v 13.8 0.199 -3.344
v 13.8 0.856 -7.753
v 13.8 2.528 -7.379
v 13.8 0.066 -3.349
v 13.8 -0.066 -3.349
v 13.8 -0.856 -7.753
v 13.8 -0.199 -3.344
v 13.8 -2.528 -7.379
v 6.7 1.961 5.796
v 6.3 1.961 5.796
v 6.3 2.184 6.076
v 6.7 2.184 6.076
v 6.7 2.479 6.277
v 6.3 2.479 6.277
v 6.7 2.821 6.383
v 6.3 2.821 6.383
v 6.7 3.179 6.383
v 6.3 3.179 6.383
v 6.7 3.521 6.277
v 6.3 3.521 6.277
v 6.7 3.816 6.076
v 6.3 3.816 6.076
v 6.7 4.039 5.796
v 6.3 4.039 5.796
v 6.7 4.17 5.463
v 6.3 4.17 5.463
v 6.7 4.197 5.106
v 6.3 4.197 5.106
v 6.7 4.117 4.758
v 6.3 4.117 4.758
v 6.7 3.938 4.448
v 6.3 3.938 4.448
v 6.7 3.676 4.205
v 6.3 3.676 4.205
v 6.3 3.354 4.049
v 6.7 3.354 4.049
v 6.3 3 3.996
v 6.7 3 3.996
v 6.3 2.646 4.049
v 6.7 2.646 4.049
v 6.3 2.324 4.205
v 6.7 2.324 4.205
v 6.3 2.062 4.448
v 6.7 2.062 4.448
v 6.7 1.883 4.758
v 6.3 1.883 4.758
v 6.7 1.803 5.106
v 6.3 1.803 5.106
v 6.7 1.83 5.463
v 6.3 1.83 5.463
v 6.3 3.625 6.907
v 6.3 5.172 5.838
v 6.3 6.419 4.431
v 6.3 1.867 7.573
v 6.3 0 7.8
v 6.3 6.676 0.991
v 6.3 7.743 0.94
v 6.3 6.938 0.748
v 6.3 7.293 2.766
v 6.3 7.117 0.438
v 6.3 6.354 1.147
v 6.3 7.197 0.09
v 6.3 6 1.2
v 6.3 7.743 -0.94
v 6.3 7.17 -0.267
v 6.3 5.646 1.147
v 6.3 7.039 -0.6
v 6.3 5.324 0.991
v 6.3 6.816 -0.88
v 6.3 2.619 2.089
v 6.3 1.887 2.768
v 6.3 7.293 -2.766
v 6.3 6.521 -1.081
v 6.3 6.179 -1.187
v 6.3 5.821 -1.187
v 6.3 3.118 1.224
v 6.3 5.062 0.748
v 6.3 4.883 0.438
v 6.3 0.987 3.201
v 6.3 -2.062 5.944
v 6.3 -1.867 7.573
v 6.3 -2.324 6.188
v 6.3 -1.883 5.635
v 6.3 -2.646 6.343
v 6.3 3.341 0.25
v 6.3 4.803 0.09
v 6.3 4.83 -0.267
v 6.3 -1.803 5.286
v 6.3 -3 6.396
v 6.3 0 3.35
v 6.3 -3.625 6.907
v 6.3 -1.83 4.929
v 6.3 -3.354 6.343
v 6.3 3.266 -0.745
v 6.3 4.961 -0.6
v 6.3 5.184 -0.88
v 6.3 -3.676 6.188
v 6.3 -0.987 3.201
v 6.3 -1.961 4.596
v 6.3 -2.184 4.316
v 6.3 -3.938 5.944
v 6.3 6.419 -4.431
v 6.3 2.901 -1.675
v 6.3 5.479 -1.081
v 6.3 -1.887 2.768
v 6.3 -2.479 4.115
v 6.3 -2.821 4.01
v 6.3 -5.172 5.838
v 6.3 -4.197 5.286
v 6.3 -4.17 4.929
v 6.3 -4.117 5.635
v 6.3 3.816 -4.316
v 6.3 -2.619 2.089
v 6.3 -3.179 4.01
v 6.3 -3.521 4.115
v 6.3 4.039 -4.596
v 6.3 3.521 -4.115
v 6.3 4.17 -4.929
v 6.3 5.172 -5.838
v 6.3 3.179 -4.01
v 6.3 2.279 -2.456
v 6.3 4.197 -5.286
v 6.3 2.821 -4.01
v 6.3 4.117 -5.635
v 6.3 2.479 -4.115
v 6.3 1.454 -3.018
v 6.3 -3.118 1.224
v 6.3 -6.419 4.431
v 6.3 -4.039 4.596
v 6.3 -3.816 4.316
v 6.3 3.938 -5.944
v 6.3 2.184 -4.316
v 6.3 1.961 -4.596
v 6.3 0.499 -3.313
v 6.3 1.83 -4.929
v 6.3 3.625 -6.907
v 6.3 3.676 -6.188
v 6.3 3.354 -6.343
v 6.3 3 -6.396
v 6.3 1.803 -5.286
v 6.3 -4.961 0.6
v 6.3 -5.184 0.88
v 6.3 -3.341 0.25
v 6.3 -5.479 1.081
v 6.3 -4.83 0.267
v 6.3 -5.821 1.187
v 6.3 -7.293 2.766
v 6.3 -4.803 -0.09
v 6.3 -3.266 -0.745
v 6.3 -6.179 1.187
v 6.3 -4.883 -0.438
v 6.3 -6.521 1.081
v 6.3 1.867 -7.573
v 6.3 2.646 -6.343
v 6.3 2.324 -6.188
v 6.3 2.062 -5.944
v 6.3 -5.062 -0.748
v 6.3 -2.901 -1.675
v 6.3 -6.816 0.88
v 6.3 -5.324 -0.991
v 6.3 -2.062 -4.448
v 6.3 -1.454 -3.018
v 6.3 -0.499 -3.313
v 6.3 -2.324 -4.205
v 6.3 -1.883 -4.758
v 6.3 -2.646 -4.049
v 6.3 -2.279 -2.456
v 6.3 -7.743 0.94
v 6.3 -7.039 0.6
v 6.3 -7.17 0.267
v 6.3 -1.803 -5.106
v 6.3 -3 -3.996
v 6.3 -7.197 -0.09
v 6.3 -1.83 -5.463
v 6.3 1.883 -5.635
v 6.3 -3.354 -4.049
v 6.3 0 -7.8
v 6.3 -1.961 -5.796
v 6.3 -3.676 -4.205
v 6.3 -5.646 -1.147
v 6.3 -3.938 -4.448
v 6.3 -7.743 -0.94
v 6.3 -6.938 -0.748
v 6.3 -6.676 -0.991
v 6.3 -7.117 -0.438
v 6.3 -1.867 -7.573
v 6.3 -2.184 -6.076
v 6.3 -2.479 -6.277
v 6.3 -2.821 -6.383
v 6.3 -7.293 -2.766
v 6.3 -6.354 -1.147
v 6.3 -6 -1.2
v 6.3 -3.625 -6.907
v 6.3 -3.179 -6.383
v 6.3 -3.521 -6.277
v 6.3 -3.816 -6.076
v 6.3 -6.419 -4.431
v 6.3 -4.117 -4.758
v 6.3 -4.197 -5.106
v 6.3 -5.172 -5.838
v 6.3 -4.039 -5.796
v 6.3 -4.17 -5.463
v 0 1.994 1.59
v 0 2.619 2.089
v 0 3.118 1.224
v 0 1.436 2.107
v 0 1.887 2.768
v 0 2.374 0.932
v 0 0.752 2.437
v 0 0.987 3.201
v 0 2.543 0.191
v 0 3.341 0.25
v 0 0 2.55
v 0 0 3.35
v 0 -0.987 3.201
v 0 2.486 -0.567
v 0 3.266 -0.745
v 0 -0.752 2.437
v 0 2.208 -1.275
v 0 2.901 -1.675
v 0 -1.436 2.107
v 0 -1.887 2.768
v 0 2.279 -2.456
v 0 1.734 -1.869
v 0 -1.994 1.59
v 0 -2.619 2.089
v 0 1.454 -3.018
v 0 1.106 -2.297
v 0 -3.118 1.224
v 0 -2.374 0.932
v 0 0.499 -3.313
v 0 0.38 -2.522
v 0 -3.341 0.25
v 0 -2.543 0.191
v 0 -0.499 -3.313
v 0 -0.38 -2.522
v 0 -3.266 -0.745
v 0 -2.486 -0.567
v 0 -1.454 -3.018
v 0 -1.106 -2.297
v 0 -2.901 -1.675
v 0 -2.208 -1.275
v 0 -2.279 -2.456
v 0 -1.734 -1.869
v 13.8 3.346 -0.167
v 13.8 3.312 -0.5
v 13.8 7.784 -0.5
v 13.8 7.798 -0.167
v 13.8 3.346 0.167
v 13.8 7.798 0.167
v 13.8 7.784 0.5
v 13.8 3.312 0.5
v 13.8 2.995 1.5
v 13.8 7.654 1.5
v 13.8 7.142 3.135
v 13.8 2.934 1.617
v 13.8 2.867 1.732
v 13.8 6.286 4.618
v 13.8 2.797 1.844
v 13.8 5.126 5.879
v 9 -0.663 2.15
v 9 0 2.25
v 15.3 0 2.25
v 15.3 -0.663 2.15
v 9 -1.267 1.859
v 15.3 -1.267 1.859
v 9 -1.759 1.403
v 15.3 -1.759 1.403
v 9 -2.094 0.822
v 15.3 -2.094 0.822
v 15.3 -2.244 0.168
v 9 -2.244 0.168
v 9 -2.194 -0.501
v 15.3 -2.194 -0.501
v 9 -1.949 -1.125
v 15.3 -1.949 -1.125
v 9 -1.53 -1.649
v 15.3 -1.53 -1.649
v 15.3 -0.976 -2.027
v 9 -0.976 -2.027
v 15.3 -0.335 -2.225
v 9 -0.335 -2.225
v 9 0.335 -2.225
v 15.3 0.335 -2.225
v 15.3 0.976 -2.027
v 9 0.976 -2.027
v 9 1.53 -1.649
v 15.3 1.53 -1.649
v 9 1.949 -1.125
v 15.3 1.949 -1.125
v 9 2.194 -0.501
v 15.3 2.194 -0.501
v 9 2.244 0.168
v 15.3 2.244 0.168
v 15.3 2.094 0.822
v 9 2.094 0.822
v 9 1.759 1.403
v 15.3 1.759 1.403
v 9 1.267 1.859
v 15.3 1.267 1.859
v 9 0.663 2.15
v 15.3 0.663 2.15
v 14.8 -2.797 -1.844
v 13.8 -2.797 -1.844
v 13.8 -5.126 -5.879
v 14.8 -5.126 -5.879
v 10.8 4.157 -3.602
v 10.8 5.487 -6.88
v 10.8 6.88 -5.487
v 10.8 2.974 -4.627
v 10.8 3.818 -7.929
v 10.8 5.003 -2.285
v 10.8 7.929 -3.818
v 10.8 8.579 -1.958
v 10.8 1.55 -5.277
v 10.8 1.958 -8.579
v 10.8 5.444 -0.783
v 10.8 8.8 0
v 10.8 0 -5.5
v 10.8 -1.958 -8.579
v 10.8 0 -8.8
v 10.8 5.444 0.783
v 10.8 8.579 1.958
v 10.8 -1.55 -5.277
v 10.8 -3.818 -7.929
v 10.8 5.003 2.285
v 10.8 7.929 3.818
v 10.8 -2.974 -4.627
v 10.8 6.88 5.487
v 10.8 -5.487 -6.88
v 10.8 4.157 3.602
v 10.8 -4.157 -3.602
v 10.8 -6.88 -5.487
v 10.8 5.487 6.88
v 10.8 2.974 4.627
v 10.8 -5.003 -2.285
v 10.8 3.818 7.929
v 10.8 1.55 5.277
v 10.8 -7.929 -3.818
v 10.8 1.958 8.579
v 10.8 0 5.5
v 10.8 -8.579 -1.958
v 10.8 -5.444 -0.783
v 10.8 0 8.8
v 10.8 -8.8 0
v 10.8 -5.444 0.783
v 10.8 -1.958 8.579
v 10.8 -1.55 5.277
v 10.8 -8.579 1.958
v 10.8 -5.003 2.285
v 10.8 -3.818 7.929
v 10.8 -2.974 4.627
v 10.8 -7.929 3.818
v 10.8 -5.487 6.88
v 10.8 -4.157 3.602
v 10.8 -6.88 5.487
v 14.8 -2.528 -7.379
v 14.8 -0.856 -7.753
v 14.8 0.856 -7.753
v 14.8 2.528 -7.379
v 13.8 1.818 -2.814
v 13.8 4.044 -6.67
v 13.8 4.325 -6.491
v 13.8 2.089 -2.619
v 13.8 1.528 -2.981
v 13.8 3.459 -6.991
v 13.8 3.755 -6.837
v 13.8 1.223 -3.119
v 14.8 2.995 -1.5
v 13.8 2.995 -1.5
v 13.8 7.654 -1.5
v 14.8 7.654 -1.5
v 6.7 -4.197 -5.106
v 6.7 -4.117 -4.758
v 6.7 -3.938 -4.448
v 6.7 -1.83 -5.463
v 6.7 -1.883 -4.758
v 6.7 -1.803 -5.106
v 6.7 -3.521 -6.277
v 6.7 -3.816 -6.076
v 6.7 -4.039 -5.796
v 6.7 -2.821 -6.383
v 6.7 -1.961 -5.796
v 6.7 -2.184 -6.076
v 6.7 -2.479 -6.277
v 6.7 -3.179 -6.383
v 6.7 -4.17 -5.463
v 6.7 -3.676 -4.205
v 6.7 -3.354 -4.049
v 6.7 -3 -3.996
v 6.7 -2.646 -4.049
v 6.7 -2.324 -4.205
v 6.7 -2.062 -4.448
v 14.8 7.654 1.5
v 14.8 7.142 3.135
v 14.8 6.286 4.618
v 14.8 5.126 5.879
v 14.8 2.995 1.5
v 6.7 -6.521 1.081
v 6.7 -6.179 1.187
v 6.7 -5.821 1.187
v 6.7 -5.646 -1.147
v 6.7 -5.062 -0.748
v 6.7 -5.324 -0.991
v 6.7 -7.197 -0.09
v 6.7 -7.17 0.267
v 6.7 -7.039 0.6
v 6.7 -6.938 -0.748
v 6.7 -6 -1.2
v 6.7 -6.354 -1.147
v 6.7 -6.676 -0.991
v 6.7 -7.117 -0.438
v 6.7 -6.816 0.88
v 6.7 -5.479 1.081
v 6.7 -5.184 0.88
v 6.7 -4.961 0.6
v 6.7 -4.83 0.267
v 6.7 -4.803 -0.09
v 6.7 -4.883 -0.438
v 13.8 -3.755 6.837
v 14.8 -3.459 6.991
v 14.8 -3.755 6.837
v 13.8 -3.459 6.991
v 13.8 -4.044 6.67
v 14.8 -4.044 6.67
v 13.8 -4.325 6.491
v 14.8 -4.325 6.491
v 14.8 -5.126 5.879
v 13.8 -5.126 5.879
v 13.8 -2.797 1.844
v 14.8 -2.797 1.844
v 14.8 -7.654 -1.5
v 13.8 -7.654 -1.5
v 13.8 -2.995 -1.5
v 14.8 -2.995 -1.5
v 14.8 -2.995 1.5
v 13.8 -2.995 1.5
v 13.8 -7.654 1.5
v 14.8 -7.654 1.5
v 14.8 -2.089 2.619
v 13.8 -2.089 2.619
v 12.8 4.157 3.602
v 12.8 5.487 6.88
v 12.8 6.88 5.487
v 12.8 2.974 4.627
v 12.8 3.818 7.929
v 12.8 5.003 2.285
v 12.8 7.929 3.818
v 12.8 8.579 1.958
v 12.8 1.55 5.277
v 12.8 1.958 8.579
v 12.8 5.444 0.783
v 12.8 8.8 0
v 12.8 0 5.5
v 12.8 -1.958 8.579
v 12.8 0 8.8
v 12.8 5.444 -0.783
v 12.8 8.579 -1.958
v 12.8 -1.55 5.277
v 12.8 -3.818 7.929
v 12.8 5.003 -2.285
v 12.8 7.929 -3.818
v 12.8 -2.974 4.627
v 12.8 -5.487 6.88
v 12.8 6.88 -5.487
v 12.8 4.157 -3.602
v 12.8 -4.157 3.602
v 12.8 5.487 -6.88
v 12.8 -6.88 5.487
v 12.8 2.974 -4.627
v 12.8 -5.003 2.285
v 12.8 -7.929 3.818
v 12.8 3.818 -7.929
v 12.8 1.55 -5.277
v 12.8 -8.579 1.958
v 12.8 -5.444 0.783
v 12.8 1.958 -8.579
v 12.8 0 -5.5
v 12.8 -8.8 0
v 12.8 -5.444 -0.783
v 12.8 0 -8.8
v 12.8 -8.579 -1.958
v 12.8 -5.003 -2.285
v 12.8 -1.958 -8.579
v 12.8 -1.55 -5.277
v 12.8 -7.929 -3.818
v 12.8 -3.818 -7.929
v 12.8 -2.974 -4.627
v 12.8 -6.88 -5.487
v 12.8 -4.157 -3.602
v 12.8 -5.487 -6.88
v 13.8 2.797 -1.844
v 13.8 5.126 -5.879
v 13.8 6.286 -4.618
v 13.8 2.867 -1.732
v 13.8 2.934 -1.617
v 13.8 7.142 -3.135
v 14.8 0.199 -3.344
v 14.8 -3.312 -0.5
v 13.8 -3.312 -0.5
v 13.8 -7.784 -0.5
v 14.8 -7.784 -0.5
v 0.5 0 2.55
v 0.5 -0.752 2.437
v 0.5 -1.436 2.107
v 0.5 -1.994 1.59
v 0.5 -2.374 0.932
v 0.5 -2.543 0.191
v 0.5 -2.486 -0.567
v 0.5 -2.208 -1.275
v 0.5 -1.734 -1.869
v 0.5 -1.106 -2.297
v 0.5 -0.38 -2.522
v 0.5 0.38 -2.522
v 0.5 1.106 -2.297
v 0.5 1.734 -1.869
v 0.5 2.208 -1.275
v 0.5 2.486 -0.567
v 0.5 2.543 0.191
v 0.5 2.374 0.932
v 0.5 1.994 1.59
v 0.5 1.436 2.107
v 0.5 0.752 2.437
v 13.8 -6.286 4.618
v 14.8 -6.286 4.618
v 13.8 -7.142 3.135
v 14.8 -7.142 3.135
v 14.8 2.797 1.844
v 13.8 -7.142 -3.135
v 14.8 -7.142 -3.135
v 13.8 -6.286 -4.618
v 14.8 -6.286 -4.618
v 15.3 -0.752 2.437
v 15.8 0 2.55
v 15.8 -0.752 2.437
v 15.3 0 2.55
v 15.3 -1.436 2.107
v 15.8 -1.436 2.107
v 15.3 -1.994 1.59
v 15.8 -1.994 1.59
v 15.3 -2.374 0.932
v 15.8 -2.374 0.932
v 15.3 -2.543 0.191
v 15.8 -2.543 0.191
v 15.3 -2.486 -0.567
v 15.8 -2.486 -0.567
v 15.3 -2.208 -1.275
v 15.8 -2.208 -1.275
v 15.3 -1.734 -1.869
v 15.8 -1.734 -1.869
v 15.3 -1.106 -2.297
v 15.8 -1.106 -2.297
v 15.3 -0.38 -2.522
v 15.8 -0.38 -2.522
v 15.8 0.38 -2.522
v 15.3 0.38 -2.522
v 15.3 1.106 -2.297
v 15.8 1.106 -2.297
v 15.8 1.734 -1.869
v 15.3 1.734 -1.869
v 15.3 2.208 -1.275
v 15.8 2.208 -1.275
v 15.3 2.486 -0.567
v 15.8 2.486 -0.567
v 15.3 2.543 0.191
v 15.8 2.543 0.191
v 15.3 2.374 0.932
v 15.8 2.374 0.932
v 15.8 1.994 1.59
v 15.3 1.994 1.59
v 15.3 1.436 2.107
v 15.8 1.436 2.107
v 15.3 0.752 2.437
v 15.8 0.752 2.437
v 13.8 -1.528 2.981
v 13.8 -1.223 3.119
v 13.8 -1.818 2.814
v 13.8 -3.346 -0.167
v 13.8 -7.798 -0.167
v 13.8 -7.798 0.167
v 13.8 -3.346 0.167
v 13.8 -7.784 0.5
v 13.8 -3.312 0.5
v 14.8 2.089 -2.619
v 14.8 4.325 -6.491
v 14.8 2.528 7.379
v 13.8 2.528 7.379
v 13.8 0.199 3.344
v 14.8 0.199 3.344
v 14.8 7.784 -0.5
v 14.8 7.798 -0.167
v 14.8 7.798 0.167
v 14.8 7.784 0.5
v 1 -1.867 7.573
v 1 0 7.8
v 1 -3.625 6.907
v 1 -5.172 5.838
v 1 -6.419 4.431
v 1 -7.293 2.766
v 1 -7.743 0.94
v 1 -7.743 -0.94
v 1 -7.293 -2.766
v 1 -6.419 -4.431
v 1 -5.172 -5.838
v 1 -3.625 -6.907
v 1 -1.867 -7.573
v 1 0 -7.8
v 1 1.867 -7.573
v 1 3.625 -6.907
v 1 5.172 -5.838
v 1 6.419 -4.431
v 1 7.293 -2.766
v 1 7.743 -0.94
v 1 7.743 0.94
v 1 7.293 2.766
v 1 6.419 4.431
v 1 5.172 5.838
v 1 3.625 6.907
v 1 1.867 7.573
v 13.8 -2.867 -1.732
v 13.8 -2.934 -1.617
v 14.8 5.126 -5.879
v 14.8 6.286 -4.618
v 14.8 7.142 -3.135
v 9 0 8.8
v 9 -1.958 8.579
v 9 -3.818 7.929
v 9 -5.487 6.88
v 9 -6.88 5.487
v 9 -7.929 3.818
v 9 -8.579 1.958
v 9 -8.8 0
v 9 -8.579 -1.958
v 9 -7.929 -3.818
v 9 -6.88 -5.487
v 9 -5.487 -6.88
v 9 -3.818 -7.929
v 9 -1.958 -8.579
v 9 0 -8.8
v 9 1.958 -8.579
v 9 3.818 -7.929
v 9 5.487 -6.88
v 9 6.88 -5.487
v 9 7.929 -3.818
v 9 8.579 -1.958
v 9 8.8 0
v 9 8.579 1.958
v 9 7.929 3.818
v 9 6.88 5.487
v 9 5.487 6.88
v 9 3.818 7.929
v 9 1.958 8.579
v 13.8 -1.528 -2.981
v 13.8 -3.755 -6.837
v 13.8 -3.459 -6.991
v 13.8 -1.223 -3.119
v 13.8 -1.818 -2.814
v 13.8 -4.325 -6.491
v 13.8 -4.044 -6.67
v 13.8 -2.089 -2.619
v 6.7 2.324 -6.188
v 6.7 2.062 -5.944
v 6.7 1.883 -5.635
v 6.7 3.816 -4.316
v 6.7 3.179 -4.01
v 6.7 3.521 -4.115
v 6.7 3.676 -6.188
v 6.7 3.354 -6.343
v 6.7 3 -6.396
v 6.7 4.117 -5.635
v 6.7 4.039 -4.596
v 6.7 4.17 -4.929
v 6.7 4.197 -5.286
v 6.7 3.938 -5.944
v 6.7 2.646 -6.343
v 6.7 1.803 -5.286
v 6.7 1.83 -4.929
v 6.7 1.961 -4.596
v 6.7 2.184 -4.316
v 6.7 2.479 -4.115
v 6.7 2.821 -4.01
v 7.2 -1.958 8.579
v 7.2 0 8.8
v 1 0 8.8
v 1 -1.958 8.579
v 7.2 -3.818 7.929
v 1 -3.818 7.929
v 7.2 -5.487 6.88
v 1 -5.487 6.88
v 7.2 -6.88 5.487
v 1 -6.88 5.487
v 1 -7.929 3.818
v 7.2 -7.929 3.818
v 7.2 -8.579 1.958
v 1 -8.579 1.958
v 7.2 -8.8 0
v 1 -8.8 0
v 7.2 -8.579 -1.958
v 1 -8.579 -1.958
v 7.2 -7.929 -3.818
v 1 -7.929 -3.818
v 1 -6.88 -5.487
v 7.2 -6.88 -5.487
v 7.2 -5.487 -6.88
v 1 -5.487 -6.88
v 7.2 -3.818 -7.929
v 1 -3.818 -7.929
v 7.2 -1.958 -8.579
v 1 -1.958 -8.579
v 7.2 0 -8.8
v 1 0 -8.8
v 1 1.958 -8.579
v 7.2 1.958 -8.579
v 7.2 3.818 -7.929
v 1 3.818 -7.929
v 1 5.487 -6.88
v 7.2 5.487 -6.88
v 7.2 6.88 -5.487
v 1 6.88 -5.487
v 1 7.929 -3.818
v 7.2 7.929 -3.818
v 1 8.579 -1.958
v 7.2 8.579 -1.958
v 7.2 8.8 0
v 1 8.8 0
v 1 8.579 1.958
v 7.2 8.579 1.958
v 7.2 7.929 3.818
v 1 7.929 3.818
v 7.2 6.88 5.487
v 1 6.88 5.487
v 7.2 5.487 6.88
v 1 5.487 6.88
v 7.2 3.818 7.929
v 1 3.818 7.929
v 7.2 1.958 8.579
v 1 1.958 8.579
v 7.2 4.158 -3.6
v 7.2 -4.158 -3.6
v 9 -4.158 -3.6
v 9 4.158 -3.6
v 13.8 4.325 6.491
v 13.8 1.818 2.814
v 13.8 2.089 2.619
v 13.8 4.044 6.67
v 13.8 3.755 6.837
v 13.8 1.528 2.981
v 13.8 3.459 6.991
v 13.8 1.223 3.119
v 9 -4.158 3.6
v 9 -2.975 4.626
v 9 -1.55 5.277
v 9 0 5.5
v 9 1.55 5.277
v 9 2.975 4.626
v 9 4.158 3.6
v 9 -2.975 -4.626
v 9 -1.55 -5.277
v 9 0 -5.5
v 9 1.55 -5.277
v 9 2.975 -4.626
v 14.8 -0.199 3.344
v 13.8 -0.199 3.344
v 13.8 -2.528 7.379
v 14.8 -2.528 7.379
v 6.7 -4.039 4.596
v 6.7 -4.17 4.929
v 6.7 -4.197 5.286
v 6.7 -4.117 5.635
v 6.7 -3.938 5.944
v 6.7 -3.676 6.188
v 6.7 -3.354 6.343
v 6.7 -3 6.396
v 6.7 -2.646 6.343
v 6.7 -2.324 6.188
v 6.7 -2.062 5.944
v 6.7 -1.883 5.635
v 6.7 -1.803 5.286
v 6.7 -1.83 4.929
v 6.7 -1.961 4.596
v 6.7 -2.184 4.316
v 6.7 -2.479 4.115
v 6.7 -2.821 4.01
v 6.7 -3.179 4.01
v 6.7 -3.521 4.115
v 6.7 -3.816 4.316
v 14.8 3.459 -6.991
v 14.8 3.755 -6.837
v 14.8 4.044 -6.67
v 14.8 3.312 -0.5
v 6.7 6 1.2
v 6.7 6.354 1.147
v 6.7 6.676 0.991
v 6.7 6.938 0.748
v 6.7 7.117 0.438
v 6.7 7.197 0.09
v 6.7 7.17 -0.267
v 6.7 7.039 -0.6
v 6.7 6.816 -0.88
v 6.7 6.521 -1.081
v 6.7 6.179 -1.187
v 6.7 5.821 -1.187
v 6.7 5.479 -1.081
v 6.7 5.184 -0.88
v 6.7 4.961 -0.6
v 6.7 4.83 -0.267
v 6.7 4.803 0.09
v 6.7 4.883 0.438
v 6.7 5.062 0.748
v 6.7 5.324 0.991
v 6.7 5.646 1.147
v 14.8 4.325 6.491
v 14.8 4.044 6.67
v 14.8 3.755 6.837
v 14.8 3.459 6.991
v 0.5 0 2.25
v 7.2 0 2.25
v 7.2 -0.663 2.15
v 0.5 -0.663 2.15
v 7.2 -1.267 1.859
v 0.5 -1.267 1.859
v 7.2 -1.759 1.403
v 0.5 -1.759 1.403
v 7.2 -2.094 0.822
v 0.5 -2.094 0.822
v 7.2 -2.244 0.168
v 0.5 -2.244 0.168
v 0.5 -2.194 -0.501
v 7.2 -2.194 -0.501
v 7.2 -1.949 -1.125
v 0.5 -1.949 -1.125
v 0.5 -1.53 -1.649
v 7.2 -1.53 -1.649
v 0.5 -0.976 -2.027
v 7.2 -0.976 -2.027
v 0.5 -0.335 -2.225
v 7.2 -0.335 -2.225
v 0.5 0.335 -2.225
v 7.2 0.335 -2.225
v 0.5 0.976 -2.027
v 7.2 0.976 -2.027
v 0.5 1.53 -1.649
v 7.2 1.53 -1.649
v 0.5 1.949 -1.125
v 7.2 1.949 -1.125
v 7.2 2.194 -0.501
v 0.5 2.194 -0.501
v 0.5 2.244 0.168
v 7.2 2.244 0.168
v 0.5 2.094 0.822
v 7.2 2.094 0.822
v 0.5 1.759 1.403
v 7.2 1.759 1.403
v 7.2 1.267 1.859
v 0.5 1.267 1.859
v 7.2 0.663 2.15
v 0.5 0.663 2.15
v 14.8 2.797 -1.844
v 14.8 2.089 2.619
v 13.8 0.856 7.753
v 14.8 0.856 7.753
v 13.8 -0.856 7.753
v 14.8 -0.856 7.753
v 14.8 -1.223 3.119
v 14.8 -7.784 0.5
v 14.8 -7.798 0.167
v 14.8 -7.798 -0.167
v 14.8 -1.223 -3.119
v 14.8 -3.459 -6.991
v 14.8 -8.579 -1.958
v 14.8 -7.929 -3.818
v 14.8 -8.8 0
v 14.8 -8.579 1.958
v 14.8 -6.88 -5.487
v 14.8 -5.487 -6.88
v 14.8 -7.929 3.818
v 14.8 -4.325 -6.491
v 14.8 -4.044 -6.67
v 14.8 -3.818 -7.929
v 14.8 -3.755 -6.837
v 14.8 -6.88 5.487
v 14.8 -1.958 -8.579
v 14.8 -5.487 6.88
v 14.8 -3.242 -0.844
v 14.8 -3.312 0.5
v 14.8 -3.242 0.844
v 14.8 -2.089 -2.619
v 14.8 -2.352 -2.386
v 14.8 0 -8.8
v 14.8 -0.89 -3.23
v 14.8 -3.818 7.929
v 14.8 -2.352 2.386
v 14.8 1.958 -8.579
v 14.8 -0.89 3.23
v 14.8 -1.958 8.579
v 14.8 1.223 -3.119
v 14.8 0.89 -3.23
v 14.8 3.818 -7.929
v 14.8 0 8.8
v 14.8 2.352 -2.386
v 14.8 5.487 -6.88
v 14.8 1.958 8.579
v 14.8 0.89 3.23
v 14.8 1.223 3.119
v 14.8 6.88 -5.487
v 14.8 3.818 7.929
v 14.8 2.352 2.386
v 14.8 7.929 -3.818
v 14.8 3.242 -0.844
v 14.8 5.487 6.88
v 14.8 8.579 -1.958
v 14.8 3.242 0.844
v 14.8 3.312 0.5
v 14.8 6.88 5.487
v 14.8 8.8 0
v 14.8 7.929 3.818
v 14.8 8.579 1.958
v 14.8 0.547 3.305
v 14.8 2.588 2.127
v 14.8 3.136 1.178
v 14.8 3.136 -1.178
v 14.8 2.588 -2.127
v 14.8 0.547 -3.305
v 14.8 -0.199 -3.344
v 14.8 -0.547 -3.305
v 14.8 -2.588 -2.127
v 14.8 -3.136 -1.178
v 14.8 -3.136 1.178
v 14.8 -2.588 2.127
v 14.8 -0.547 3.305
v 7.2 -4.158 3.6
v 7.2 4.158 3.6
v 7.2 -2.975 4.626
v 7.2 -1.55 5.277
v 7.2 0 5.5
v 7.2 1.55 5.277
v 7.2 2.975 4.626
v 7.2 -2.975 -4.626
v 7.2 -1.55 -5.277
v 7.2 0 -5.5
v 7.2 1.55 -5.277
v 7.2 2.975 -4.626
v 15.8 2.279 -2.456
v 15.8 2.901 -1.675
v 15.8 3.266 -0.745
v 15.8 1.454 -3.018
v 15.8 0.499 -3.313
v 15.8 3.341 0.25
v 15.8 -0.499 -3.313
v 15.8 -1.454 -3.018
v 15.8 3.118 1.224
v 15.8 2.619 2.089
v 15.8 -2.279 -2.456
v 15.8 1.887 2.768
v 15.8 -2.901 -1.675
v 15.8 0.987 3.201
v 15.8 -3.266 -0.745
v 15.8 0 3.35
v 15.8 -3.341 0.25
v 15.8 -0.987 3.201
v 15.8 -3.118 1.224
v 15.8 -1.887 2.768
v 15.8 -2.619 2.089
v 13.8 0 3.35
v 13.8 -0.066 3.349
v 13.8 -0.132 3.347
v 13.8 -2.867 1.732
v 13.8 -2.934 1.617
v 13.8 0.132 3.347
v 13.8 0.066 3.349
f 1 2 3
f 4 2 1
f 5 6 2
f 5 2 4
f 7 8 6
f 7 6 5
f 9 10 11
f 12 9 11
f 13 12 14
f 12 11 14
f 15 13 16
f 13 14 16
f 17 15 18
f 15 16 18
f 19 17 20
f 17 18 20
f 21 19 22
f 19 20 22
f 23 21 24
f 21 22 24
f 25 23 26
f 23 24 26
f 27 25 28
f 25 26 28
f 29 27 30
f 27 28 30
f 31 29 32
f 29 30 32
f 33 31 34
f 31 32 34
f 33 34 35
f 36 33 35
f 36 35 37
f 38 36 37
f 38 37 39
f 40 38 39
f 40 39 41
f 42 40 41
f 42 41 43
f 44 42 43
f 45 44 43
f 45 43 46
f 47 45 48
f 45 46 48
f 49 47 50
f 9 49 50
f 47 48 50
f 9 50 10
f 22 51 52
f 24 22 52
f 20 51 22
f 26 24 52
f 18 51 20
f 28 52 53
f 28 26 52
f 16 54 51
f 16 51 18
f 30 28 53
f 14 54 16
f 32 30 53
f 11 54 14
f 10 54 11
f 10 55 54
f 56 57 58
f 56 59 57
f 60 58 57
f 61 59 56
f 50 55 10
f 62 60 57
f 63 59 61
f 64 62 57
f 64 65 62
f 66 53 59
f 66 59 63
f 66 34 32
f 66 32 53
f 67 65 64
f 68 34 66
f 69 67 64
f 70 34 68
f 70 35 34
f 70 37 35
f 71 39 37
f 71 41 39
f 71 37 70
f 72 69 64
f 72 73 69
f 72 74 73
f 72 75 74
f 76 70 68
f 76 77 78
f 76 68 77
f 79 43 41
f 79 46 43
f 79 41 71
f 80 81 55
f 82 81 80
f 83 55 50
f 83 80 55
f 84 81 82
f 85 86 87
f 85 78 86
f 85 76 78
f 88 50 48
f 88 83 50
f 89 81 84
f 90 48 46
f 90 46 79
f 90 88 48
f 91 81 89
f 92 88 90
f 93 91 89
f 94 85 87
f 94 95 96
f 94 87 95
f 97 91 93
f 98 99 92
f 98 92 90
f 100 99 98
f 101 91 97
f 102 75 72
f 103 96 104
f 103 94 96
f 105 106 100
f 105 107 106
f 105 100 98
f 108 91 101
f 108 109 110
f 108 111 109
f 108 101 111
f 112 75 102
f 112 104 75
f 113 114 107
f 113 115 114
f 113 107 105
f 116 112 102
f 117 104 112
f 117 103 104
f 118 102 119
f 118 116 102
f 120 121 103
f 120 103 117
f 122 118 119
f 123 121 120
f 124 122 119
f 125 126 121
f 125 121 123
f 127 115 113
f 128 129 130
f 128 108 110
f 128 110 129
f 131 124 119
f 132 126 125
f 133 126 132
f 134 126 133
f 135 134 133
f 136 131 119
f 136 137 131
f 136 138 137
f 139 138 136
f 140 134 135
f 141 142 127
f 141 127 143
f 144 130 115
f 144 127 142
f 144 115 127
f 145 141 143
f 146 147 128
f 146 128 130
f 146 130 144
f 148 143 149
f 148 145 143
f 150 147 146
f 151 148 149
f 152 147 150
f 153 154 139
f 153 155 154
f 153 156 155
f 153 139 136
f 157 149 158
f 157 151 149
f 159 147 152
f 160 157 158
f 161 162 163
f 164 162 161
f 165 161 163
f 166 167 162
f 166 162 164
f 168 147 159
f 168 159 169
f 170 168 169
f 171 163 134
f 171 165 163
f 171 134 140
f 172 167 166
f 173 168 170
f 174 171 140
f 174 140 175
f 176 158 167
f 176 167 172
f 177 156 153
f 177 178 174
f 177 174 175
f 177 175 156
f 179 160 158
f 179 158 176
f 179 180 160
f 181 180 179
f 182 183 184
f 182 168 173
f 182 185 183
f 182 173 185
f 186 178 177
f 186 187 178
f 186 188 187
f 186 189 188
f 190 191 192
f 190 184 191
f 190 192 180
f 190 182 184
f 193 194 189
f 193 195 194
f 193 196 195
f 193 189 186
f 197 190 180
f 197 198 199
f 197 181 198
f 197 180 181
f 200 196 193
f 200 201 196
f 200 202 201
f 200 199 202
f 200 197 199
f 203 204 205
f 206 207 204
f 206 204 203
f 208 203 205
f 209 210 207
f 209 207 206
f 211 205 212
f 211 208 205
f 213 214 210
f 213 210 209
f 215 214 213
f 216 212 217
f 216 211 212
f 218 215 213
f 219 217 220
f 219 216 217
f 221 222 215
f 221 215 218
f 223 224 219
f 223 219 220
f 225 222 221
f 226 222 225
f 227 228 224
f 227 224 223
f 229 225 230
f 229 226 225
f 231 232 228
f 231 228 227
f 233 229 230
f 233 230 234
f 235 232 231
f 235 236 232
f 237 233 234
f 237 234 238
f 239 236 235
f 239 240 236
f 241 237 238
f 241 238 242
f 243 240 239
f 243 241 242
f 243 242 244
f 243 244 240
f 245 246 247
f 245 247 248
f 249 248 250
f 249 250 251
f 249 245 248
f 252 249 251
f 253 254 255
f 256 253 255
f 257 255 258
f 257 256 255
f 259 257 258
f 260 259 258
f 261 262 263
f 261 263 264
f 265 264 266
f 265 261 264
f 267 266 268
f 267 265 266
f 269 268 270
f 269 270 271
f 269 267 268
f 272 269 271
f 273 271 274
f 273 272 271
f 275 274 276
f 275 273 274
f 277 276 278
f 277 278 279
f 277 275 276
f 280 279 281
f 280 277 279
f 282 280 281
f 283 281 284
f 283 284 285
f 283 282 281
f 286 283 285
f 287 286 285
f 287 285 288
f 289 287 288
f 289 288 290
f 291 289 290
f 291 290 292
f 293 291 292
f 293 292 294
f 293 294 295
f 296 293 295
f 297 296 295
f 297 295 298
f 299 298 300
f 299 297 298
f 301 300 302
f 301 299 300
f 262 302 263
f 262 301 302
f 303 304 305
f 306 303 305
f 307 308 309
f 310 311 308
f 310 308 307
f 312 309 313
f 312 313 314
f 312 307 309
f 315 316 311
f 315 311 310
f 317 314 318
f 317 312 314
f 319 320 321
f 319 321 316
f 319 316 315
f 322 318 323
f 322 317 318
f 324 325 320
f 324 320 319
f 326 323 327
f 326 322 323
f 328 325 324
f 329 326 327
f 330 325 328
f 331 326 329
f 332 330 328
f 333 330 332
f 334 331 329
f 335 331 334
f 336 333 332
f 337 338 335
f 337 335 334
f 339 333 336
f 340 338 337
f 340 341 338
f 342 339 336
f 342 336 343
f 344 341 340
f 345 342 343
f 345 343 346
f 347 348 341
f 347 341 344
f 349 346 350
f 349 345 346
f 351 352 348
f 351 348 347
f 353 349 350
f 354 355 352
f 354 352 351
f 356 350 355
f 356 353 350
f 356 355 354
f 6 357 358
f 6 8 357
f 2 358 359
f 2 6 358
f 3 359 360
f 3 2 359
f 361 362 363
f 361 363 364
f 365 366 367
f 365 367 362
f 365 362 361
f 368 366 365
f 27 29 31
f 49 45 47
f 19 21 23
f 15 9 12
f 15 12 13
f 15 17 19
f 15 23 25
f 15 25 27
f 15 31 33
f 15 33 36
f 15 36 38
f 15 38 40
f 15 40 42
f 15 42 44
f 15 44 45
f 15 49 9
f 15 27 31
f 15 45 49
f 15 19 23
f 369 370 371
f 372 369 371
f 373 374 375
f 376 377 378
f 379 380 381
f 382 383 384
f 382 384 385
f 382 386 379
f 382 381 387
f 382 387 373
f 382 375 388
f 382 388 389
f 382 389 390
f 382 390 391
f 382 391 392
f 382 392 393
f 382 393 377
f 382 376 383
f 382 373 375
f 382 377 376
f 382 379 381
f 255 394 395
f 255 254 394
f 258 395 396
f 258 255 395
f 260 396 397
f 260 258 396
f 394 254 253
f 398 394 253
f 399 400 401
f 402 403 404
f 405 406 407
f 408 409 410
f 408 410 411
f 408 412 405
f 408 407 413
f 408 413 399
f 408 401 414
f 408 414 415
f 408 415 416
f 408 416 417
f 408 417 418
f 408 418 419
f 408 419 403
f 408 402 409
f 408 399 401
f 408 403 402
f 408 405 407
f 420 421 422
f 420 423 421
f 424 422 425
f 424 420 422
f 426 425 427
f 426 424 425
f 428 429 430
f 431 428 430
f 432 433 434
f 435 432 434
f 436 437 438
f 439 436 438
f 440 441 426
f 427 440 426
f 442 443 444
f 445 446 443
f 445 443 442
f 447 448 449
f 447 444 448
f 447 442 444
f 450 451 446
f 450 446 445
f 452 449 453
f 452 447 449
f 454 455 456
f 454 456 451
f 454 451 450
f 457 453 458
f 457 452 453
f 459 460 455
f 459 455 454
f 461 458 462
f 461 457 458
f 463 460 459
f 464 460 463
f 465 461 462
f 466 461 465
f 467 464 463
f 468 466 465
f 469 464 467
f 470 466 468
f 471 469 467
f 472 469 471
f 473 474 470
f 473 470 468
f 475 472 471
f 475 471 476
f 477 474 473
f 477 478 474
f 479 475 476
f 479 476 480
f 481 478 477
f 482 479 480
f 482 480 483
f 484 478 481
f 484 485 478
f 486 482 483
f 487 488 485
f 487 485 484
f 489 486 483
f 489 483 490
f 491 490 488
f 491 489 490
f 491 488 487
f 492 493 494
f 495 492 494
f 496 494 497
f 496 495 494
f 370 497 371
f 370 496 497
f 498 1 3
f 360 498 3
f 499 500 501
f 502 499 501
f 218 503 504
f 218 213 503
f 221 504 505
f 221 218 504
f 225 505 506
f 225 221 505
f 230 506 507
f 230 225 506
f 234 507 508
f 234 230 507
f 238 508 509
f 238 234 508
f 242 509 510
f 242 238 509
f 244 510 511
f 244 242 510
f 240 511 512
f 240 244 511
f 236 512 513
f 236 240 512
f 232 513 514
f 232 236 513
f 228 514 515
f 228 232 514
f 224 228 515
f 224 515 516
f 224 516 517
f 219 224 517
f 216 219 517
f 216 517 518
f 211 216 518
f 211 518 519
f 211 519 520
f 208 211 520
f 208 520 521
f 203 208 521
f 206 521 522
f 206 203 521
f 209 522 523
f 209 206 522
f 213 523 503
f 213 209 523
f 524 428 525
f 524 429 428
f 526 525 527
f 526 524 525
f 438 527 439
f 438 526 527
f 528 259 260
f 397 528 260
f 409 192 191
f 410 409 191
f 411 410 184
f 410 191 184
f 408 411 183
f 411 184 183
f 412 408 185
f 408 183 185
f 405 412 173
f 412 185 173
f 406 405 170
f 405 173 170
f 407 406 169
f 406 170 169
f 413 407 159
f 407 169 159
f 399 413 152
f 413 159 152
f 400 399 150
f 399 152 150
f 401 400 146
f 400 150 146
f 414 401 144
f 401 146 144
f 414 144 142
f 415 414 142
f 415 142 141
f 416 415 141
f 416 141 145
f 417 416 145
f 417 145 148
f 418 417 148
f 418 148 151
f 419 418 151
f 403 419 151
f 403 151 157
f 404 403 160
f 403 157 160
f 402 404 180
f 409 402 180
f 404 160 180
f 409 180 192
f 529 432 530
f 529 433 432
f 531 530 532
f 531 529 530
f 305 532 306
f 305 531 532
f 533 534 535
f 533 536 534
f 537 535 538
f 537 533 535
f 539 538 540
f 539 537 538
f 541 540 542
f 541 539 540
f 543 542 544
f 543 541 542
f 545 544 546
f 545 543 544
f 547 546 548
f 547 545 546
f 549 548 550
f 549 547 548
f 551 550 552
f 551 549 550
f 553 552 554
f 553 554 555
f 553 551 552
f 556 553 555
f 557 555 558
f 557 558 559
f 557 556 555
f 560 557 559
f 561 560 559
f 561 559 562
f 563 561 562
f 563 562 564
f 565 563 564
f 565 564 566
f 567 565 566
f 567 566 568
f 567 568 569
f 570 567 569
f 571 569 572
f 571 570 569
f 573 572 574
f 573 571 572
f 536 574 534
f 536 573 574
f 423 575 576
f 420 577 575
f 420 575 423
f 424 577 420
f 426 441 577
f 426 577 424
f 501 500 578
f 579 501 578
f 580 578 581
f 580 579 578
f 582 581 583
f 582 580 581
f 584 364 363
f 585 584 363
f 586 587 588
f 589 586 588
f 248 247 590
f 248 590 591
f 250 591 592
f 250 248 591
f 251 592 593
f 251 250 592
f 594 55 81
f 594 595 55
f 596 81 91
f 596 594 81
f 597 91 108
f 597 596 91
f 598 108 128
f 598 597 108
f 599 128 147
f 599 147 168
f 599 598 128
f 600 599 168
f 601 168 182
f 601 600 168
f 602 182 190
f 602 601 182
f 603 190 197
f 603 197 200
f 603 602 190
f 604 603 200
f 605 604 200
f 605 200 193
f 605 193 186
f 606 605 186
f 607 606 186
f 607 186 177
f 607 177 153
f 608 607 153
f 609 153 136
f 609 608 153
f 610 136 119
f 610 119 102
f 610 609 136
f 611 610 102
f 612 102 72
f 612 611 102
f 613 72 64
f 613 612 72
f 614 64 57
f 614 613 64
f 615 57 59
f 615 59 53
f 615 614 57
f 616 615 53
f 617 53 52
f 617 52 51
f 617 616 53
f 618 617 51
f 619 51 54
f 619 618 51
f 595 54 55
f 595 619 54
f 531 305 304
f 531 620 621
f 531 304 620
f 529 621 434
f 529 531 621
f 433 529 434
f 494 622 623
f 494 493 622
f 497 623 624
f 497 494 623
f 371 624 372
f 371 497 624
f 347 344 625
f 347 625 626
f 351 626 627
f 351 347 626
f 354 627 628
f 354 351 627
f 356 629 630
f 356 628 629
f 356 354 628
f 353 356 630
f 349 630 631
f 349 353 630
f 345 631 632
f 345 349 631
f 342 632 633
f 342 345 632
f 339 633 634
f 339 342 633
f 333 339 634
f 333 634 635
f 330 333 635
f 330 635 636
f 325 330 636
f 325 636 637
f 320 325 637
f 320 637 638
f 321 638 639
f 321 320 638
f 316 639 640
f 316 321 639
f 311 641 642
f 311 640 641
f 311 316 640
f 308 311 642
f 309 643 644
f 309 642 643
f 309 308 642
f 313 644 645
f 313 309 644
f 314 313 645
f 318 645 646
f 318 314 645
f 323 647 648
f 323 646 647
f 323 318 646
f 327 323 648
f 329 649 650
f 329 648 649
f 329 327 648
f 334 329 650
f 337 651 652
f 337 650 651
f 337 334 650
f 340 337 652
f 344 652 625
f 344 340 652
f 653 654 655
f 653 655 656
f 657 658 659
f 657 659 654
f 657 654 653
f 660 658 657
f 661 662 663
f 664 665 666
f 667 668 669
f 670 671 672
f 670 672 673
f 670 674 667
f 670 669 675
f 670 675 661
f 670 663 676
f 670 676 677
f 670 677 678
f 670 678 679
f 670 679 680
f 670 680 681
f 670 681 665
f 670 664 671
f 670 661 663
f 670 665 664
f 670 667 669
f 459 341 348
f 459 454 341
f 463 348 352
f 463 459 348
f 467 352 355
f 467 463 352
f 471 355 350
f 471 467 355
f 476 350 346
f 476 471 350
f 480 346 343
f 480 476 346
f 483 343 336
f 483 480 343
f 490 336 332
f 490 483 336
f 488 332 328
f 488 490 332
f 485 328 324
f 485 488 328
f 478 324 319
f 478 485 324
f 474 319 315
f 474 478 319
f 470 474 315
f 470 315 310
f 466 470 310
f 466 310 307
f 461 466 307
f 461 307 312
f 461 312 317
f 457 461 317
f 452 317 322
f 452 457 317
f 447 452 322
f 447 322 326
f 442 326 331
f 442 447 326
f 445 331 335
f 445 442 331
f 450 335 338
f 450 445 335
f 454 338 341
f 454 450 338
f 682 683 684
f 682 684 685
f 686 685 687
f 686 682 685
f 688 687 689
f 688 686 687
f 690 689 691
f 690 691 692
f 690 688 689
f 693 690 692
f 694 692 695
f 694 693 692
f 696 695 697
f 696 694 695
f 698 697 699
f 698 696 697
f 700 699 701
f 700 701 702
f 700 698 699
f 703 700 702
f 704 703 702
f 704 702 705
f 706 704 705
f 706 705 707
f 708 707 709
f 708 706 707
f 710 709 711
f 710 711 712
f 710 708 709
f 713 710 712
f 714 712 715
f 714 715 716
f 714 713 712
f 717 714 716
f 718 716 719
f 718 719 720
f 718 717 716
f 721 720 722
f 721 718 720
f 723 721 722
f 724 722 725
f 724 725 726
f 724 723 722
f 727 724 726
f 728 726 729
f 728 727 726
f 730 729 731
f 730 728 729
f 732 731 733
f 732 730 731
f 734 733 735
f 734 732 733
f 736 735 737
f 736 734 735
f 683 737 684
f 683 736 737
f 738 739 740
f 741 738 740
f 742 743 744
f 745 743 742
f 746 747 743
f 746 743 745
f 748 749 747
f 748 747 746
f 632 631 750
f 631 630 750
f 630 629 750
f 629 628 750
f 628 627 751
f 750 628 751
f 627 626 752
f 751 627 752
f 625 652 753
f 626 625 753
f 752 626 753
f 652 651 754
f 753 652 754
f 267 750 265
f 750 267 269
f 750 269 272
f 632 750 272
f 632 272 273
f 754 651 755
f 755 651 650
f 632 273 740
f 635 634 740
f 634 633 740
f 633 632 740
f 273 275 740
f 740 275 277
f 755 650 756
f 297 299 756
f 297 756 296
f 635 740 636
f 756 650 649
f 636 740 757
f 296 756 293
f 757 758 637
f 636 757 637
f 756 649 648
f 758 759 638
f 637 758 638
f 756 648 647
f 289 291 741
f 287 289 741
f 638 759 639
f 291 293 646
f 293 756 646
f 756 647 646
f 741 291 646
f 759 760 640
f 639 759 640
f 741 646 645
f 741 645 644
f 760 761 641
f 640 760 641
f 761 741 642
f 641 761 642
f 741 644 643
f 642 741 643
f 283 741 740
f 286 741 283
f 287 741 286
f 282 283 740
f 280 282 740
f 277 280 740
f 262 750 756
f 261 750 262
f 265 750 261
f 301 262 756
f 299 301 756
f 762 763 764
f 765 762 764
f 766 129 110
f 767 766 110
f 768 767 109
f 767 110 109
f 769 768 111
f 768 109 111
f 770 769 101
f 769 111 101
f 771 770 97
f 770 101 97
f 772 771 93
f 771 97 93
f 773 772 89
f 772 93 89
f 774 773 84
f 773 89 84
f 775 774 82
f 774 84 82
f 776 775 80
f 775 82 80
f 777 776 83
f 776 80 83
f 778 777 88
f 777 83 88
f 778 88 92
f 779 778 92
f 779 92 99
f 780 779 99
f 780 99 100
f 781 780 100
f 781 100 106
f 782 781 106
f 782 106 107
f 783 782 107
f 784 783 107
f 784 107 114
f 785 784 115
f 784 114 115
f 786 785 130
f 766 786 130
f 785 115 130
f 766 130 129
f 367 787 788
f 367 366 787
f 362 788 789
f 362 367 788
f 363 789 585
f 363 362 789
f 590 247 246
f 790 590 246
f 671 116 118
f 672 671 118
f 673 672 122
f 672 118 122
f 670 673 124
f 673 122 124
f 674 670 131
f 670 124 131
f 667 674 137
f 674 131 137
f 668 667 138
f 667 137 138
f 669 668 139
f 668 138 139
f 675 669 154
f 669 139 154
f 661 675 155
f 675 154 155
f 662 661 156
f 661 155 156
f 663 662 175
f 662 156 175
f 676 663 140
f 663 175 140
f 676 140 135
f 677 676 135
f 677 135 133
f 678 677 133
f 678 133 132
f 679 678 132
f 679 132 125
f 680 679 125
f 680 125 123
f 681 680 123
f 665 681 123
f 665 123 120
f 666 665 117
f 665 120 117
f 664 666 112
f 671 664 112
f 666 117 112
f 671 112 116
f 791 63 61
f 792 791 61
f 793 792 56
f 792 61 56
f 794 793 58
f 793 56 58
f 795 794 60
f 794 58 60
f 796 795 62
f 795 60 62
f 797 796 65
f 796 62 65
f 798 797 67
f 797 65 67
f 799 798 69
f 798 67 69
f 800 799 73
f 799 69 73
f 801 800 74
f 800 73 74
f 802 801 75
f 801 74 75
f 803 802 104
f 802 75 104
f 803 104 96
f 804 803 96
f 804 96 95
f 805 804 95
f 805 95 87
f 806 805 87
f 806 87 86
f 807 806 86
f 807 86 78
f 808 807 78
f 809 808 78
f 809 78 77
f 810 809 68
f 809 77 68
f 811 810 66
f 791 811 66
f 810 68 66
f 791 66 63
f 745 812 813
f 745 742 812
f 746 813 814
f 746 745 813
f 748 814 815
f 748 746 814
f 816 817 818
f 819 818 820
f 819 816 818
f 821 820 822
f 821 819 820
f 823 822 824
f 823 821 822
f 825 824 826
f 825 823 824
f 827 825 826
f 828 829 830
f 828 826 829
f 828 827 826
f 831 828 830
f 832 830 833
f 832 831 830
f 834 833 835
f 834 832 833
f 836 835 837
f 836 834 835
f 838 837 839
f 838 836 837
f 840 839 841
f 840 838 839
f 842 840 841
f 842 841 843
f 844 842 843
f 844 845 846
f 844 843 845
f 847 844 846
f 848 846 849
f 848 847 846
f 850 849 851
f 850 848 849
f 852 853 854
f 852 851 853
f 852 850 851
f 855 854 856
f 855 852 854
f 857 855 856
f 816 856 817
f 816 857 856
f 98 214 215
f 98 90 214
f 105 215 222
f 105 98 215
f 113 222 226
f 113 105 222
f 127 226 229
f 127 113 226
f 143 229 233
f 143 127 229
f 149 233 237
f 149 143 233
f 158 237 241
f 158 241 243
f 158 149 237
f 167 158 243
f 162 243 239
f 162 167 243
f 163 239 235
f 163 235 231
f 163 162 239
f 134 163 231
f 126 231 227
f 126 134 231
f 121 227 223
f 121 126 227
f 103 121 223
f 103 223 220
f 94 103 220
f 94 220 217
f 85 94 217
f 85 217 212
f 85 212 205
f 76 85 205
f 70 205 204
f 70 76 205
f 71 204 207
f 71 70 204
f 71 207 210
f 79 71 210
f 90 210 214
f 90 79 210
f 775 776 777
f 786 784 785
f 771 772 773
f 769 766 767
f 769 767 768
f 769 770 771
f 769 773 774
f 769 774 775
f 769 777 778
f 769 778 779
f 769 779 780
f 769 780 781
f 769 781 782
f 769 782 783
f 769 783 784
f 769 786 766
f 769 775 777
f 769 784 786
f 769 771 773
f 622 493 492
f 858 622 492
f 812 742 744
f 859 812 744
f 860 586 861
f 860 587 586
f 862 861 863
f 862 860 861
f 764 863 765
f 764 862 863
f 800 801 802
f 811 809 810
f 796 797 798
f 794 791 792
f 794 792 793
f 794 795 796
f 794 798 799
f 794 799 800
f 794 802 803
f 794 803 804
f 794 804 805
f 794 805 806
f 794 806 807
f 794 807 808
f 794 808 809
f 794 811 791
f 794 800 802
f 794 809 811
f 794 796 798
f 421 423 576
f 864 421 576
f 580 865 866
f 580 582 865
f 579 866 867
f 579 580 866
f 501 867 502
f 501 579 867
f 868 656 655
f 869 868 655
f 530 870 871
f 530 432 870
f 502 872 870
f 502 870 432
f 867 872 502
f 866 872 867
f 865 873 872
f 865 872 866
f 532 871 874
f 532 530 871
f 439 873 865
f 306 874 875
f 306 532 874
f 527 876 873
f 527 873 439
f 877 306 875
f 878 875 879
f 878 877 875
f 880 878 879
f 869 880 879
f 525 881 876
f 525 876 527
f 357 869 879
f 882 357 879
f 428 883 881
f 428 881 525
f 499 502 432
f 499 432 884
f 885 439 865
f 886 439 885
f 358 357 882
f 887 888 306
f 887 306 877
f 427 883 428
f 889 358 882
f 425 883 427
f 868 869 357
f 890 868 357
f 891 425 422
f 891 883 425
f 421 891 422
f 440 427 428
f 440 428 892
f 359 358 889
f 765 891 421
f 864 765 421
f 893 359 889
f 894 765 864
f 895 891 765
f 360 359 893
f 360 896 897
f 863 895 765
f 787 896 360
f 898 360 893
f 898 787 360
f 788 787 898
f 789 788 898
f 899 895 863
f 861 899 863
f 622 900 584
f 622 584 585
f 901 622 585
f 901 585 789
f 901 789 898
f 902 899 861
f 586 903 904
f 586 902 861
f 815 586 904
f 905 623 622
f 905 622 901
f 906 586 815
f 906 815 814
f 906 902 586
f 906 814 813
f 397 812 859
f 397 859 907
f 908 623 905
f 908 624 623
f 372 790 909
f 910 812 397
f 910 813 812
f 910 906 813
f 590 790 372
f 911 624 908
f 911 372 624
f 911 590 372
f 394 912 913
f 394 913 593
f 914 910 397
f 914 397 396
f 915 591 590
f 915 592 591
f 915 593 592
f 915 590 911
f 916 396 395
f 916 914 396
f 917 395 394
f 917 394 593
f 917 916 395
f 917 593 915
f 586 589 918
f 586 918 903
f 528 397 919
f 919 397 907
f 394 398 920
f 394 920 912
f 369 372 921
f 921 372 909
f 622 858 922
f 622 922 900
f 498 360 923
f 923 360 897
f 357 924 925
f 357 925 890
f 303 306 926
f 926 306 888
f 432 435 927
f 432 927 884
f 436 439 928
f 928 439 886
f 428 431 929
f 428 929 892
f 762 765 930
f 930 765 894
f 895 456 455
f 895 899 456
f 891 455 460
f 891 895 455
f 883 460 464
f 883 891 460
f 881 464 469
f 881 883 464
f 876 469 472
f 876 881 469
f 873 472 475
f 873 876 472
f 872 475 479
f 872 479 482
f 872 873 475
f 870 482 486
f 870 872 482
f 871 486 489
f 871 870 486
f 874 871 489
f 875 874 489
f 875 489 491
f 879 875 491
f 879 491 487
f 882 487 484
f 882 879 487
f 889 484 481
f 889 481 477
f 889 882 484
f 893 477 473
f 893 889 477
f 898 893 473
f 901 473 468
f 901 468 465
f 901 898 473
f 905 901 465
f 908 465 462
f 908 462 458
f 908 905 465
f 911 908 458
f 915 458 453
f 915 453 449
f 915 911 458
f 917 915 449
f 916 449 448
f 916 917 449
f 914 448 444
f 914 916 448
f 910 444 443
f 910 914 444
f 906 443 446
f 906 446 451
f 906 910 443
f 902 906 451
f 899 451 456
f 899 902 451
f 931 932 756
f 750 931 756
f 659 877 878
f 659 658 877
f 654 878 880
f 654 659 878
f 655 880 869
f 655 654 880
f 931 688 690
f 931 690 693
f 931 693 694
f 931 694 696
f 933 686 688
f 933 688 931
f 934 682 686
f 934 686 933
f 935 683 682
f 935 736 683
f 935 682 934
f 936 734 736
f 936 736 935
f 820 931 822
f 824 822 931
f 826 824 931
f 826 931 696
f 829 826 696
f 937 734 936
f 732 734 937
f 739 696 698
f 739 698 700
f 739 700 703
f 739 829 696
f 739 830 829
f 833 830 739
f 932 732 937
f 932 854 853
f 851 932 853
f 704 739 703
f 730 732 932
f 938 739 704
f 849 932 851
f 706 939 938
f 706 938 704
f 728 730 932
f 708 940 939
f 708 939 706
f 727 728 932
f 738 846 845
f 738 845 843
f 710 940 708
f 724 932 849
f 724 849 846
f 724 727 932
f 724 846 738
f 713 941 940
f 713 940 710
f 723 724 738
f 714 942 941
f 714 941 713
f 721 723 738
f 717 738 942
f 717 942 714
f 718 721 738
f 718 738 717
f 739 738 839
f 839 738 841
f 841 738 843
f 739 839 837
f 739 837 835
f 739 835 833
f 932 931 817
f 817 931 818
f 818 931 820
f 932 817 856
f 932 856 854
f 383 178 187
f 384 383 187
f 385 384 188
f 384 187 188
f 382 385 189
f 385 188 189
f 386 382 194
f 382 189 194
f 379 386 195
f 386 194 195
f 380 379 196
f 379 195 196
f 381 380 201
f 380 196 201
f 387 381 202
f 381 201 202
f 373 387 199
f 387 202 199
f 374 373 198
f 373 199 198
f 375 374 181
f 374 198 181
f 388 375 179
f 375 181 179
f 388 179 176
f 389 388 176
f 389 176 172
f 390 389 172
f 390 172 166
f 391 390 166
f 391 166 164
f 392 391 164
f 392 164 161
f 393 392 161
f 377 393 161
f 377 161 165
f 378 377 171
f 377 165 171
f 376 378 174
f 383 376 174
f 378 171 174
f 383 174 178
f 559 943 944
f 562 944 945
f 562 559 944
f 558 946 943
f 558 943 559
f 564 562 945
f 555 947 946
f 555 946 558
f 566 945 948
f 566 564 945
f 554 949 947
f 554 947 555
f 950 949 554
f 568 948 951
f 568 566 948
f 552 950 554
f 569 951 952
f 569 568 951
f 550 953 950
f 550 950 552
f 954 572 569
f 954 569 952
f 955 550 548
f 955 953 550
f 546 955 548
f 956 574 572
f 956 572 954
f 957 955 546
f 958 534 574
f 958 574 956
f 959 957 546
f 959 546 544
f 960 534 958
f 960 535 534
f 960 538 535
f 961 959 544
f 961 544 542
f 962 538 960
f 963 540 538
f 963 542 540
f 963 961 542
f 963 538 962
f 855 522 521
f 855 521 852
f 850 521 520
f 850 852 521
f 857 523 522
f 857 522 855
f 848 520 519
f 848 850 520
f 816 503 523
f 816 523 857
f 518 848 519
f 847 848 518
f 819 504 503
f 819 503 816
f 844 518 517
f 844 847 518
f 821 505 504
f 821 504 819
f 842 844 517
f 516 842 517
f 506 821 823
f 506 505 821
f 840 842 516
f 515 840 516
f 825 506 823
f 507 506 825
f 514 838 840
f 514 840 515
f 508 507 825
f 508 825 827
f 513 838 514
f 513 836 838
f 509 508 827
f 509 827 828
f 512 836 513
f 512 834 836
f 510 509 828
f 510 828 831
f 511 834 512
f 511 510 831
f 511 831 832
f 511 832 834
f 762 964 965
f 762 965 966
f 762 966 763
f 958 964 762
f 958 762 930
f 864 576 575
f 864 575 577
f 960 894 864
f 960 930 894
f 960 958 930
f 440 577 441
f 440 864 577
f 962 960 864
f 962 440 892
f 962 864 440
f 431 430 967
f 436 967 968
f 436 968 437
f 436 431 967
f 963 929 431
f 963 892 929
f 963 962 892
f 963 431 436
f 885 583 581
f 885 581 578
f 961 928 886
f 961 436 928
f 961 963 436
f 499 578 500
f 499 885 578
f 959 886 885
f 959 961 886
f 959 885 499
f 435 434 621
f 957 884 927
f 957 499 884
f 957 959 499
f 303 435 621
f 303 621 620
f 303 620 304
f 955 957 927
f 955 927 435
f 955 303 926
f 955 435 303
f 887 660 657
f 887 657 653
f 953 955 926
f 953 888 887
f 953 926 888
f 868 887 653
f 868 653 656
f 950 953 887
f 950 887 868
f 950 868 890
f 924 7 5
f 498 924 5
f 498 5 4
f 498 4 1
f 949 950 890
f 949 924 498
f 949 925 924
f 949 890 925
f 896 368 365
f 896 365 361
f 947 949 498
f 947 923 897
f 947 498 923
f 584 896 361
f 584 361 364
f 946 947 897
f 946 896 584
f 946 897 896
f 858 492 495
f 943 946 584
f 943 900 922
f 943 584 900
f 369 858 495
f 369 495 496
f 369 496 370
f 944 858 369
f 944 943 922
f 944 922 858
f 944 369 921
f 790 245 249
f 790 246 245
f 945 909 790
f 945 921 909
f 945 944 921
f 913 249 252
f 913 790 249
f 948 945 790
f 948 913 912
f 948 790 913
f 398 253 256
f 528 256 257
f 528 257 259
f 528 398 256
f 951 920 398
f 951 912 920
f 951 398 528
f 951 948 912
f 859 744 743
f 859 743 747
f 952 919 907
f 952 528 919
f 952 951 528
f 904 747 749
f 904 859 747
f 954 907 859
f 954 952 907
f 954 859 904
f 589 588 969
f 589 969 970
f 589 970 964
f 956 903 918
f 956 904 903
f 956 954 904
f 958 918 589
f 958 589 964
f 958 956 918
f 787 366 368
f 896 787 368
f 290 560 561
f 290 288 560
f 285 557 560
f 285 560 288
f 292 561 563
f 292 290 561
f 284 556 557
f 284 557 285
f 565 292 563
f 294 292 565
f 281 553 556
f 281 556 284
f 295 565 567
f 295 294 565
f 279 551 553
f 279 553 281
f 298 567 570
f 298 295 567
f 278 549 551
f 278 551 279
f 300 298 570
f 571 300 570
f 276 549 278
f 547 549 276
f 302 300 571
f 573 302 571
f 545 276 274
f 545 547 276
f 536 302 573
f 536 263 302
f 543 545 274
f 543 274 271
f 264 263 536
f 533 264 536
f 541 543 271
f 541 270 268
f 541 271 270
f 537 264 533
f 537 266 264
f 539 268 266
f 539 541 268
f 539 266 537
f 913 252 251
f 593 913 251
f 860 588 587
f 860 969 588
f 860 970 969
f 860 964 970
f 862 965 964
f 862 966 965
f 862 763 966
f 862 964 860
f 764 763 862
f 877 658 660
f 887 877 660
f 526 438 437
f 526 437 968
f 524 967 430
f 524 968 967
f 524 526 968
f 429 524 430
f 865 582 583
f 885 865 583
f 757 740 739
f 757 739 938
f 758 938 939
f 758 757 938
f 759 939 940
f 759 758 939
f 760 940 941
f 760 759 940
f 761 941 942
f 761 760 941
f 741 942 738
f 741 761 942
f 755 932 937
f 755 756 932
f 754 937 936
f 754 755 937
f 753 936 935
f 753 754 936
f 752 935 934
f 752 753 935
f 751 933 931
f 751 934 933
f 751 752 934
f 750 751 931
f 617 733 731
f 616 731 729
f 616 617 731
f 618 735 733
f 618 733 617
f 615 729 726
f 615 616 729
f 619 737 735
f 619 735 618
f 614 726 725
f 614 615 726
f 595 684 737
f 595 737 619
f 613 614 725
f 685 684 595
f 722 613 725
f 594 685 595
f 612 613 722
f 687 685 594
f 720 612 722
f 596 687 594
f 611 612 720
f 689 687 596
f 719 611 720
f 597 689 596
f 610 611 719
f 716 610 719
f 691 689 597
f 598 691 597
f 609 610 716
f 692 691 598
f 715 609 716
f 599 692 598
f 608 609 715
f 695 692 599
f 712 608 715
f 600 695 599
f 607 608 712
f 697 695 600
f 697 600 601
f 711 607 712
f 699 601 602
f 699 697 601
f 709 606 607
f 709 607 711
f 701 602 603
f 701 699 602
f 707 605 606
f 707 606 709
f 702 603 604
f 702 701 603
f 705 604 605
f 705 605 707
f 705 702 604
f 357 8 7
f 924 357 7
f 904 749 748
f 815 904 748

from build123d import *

# Parameters (mm, degrees)
BOSS_EXTRUDE2_DEPTH = 1
CIRPATTERN1_COUNT   = 6
SKETCH3_W           = 1.8
SKETCH3_H           = 7.2
CUT_EXTRUDE1_DEPTH  = 24.055801873
SKETCH4_R           = 1.2
CUT_EXTRUDE2_DEPTH  = 0.4
CIRPATTERN2_COUNT   = 6


with BuildPart() as part:
    # Sketch1 → Revolve1 (revolve)
    with BuildSketch(Plane.XY, mode=Mode.PRIVATE) as revolve1_sk:
        Polygon((15.8, 3.35), (15.8, 2.55), (15.3, 2.55), (15.3, 2.25), (0.5, 2.25), (0.5, 2.55), (0, 2.55), (0, 3.35), (6.3, 3.35), (6.3, 7.8), (1, 7.8), (1, 8.8), (7.2, 8.8), (7.2, 5.5), (9, 5.5), (9, 8.8), (10.8, 8.8), (10.8, 5.5), (12.8, 5.5), (12.8, 8.8), (14.8, 8.8), (14.8, 7.8), (13.8, 7.8), (13.8, 3.35), align=None)
    revolve(revolve1_sk.sketch.rotate(Axis((0, 0, 0), (1, 0, 0)), 90), axis=Axis((0, 0, 0), (1, 0, 0)))

    # Sketch2 → Boss-Extrude2 (add)
    with BuildSketch(Plane(origin=(13.8, 0, 0), x_dir=(0, 0, -1), z_dir=(1, 0, 0))):
        with BuildLine():
            Line((-1.5, 7.654410493), (-1.5, 2.99541316))
            ThreePointArc((-1.5, 2.99541316), (-1.012488161, 3.193331759), (-0.5, 3.312476415))
            Line((-0.5, 3.312476415), (-0.5, 7.783957862))
            ThreePointArc((-0.5, 7.783957862), (-1.002095619, 7.735360649), (-1.5, 7.654410493))
        make_face()
        with BuildLine():
            Line((0.5, 7.783957862), (0.5, 3.312476415))
            ThreePointArc((0.5, 3.312476415), (1.012469043, 3.193337821), (1.5, 2.99541316))
            Line((1.5, 2.99541316), (1.5, 7.654410493))
            ThreePointArc((1.5, 7.654410493), (1.002095619, 7.735360649), (0.5, 7.783957862))
        make_face()
    boss_extrude2 = extrude(amount=BOSS_EXTRUDE2_DEPTH)

    # CirPattern1: Boss-Extrude2 ×6 about axis
    cirpattern1_axis = Axis((0, 0, 0), (1, 0, 0))
    for i in range(1, CIRPATTERN1_COUNT):
        add(boss_extrude2.rotate(cirpattern1_axis, i * 360 / CIRPATTERN1_COUNT))

    # Sketch3 → Cut-Extrude1 (cut, through all)
    with BuildSketch(Plane(origin=(0, 5.5, 0), x_dir=(1, 0, 0), z_dir=(0, 1, 0))):
        with Locations((8.1, 0)):
            Rectangle(SKETCH3_W, SKETCH3_H)
    extrude(amount=-CUT_EXTRUDE1_DEPTH, mode=Mode.SUBTRACT)

    # Sketch4 → Cut-Extrude2 (cut)
    with BuildSketch(Plane.ZY.offset(-6.3)):
        with Locations((0, 6)):
            Circle(SKETCH4_R)
    cut_extrude2 = extrude(amount=-CUT_EXTRUDE2_DEPTH, mode=Mode.SUBTRACT)

    # CirPattern2: Cut-Extrude2 ×6 about axis
    cirpattern2_axis = Axis((0, 0, 0), (1, 0, 0))
    for i in range(1, CIRPATTERN2_COUNT):
        add(cut_extrude2.rotate(cirpattern2_axis, i * 360 / CIRPATTERN2_COUNT), mode=Mode.SUBTRACT)


solid = part.part
